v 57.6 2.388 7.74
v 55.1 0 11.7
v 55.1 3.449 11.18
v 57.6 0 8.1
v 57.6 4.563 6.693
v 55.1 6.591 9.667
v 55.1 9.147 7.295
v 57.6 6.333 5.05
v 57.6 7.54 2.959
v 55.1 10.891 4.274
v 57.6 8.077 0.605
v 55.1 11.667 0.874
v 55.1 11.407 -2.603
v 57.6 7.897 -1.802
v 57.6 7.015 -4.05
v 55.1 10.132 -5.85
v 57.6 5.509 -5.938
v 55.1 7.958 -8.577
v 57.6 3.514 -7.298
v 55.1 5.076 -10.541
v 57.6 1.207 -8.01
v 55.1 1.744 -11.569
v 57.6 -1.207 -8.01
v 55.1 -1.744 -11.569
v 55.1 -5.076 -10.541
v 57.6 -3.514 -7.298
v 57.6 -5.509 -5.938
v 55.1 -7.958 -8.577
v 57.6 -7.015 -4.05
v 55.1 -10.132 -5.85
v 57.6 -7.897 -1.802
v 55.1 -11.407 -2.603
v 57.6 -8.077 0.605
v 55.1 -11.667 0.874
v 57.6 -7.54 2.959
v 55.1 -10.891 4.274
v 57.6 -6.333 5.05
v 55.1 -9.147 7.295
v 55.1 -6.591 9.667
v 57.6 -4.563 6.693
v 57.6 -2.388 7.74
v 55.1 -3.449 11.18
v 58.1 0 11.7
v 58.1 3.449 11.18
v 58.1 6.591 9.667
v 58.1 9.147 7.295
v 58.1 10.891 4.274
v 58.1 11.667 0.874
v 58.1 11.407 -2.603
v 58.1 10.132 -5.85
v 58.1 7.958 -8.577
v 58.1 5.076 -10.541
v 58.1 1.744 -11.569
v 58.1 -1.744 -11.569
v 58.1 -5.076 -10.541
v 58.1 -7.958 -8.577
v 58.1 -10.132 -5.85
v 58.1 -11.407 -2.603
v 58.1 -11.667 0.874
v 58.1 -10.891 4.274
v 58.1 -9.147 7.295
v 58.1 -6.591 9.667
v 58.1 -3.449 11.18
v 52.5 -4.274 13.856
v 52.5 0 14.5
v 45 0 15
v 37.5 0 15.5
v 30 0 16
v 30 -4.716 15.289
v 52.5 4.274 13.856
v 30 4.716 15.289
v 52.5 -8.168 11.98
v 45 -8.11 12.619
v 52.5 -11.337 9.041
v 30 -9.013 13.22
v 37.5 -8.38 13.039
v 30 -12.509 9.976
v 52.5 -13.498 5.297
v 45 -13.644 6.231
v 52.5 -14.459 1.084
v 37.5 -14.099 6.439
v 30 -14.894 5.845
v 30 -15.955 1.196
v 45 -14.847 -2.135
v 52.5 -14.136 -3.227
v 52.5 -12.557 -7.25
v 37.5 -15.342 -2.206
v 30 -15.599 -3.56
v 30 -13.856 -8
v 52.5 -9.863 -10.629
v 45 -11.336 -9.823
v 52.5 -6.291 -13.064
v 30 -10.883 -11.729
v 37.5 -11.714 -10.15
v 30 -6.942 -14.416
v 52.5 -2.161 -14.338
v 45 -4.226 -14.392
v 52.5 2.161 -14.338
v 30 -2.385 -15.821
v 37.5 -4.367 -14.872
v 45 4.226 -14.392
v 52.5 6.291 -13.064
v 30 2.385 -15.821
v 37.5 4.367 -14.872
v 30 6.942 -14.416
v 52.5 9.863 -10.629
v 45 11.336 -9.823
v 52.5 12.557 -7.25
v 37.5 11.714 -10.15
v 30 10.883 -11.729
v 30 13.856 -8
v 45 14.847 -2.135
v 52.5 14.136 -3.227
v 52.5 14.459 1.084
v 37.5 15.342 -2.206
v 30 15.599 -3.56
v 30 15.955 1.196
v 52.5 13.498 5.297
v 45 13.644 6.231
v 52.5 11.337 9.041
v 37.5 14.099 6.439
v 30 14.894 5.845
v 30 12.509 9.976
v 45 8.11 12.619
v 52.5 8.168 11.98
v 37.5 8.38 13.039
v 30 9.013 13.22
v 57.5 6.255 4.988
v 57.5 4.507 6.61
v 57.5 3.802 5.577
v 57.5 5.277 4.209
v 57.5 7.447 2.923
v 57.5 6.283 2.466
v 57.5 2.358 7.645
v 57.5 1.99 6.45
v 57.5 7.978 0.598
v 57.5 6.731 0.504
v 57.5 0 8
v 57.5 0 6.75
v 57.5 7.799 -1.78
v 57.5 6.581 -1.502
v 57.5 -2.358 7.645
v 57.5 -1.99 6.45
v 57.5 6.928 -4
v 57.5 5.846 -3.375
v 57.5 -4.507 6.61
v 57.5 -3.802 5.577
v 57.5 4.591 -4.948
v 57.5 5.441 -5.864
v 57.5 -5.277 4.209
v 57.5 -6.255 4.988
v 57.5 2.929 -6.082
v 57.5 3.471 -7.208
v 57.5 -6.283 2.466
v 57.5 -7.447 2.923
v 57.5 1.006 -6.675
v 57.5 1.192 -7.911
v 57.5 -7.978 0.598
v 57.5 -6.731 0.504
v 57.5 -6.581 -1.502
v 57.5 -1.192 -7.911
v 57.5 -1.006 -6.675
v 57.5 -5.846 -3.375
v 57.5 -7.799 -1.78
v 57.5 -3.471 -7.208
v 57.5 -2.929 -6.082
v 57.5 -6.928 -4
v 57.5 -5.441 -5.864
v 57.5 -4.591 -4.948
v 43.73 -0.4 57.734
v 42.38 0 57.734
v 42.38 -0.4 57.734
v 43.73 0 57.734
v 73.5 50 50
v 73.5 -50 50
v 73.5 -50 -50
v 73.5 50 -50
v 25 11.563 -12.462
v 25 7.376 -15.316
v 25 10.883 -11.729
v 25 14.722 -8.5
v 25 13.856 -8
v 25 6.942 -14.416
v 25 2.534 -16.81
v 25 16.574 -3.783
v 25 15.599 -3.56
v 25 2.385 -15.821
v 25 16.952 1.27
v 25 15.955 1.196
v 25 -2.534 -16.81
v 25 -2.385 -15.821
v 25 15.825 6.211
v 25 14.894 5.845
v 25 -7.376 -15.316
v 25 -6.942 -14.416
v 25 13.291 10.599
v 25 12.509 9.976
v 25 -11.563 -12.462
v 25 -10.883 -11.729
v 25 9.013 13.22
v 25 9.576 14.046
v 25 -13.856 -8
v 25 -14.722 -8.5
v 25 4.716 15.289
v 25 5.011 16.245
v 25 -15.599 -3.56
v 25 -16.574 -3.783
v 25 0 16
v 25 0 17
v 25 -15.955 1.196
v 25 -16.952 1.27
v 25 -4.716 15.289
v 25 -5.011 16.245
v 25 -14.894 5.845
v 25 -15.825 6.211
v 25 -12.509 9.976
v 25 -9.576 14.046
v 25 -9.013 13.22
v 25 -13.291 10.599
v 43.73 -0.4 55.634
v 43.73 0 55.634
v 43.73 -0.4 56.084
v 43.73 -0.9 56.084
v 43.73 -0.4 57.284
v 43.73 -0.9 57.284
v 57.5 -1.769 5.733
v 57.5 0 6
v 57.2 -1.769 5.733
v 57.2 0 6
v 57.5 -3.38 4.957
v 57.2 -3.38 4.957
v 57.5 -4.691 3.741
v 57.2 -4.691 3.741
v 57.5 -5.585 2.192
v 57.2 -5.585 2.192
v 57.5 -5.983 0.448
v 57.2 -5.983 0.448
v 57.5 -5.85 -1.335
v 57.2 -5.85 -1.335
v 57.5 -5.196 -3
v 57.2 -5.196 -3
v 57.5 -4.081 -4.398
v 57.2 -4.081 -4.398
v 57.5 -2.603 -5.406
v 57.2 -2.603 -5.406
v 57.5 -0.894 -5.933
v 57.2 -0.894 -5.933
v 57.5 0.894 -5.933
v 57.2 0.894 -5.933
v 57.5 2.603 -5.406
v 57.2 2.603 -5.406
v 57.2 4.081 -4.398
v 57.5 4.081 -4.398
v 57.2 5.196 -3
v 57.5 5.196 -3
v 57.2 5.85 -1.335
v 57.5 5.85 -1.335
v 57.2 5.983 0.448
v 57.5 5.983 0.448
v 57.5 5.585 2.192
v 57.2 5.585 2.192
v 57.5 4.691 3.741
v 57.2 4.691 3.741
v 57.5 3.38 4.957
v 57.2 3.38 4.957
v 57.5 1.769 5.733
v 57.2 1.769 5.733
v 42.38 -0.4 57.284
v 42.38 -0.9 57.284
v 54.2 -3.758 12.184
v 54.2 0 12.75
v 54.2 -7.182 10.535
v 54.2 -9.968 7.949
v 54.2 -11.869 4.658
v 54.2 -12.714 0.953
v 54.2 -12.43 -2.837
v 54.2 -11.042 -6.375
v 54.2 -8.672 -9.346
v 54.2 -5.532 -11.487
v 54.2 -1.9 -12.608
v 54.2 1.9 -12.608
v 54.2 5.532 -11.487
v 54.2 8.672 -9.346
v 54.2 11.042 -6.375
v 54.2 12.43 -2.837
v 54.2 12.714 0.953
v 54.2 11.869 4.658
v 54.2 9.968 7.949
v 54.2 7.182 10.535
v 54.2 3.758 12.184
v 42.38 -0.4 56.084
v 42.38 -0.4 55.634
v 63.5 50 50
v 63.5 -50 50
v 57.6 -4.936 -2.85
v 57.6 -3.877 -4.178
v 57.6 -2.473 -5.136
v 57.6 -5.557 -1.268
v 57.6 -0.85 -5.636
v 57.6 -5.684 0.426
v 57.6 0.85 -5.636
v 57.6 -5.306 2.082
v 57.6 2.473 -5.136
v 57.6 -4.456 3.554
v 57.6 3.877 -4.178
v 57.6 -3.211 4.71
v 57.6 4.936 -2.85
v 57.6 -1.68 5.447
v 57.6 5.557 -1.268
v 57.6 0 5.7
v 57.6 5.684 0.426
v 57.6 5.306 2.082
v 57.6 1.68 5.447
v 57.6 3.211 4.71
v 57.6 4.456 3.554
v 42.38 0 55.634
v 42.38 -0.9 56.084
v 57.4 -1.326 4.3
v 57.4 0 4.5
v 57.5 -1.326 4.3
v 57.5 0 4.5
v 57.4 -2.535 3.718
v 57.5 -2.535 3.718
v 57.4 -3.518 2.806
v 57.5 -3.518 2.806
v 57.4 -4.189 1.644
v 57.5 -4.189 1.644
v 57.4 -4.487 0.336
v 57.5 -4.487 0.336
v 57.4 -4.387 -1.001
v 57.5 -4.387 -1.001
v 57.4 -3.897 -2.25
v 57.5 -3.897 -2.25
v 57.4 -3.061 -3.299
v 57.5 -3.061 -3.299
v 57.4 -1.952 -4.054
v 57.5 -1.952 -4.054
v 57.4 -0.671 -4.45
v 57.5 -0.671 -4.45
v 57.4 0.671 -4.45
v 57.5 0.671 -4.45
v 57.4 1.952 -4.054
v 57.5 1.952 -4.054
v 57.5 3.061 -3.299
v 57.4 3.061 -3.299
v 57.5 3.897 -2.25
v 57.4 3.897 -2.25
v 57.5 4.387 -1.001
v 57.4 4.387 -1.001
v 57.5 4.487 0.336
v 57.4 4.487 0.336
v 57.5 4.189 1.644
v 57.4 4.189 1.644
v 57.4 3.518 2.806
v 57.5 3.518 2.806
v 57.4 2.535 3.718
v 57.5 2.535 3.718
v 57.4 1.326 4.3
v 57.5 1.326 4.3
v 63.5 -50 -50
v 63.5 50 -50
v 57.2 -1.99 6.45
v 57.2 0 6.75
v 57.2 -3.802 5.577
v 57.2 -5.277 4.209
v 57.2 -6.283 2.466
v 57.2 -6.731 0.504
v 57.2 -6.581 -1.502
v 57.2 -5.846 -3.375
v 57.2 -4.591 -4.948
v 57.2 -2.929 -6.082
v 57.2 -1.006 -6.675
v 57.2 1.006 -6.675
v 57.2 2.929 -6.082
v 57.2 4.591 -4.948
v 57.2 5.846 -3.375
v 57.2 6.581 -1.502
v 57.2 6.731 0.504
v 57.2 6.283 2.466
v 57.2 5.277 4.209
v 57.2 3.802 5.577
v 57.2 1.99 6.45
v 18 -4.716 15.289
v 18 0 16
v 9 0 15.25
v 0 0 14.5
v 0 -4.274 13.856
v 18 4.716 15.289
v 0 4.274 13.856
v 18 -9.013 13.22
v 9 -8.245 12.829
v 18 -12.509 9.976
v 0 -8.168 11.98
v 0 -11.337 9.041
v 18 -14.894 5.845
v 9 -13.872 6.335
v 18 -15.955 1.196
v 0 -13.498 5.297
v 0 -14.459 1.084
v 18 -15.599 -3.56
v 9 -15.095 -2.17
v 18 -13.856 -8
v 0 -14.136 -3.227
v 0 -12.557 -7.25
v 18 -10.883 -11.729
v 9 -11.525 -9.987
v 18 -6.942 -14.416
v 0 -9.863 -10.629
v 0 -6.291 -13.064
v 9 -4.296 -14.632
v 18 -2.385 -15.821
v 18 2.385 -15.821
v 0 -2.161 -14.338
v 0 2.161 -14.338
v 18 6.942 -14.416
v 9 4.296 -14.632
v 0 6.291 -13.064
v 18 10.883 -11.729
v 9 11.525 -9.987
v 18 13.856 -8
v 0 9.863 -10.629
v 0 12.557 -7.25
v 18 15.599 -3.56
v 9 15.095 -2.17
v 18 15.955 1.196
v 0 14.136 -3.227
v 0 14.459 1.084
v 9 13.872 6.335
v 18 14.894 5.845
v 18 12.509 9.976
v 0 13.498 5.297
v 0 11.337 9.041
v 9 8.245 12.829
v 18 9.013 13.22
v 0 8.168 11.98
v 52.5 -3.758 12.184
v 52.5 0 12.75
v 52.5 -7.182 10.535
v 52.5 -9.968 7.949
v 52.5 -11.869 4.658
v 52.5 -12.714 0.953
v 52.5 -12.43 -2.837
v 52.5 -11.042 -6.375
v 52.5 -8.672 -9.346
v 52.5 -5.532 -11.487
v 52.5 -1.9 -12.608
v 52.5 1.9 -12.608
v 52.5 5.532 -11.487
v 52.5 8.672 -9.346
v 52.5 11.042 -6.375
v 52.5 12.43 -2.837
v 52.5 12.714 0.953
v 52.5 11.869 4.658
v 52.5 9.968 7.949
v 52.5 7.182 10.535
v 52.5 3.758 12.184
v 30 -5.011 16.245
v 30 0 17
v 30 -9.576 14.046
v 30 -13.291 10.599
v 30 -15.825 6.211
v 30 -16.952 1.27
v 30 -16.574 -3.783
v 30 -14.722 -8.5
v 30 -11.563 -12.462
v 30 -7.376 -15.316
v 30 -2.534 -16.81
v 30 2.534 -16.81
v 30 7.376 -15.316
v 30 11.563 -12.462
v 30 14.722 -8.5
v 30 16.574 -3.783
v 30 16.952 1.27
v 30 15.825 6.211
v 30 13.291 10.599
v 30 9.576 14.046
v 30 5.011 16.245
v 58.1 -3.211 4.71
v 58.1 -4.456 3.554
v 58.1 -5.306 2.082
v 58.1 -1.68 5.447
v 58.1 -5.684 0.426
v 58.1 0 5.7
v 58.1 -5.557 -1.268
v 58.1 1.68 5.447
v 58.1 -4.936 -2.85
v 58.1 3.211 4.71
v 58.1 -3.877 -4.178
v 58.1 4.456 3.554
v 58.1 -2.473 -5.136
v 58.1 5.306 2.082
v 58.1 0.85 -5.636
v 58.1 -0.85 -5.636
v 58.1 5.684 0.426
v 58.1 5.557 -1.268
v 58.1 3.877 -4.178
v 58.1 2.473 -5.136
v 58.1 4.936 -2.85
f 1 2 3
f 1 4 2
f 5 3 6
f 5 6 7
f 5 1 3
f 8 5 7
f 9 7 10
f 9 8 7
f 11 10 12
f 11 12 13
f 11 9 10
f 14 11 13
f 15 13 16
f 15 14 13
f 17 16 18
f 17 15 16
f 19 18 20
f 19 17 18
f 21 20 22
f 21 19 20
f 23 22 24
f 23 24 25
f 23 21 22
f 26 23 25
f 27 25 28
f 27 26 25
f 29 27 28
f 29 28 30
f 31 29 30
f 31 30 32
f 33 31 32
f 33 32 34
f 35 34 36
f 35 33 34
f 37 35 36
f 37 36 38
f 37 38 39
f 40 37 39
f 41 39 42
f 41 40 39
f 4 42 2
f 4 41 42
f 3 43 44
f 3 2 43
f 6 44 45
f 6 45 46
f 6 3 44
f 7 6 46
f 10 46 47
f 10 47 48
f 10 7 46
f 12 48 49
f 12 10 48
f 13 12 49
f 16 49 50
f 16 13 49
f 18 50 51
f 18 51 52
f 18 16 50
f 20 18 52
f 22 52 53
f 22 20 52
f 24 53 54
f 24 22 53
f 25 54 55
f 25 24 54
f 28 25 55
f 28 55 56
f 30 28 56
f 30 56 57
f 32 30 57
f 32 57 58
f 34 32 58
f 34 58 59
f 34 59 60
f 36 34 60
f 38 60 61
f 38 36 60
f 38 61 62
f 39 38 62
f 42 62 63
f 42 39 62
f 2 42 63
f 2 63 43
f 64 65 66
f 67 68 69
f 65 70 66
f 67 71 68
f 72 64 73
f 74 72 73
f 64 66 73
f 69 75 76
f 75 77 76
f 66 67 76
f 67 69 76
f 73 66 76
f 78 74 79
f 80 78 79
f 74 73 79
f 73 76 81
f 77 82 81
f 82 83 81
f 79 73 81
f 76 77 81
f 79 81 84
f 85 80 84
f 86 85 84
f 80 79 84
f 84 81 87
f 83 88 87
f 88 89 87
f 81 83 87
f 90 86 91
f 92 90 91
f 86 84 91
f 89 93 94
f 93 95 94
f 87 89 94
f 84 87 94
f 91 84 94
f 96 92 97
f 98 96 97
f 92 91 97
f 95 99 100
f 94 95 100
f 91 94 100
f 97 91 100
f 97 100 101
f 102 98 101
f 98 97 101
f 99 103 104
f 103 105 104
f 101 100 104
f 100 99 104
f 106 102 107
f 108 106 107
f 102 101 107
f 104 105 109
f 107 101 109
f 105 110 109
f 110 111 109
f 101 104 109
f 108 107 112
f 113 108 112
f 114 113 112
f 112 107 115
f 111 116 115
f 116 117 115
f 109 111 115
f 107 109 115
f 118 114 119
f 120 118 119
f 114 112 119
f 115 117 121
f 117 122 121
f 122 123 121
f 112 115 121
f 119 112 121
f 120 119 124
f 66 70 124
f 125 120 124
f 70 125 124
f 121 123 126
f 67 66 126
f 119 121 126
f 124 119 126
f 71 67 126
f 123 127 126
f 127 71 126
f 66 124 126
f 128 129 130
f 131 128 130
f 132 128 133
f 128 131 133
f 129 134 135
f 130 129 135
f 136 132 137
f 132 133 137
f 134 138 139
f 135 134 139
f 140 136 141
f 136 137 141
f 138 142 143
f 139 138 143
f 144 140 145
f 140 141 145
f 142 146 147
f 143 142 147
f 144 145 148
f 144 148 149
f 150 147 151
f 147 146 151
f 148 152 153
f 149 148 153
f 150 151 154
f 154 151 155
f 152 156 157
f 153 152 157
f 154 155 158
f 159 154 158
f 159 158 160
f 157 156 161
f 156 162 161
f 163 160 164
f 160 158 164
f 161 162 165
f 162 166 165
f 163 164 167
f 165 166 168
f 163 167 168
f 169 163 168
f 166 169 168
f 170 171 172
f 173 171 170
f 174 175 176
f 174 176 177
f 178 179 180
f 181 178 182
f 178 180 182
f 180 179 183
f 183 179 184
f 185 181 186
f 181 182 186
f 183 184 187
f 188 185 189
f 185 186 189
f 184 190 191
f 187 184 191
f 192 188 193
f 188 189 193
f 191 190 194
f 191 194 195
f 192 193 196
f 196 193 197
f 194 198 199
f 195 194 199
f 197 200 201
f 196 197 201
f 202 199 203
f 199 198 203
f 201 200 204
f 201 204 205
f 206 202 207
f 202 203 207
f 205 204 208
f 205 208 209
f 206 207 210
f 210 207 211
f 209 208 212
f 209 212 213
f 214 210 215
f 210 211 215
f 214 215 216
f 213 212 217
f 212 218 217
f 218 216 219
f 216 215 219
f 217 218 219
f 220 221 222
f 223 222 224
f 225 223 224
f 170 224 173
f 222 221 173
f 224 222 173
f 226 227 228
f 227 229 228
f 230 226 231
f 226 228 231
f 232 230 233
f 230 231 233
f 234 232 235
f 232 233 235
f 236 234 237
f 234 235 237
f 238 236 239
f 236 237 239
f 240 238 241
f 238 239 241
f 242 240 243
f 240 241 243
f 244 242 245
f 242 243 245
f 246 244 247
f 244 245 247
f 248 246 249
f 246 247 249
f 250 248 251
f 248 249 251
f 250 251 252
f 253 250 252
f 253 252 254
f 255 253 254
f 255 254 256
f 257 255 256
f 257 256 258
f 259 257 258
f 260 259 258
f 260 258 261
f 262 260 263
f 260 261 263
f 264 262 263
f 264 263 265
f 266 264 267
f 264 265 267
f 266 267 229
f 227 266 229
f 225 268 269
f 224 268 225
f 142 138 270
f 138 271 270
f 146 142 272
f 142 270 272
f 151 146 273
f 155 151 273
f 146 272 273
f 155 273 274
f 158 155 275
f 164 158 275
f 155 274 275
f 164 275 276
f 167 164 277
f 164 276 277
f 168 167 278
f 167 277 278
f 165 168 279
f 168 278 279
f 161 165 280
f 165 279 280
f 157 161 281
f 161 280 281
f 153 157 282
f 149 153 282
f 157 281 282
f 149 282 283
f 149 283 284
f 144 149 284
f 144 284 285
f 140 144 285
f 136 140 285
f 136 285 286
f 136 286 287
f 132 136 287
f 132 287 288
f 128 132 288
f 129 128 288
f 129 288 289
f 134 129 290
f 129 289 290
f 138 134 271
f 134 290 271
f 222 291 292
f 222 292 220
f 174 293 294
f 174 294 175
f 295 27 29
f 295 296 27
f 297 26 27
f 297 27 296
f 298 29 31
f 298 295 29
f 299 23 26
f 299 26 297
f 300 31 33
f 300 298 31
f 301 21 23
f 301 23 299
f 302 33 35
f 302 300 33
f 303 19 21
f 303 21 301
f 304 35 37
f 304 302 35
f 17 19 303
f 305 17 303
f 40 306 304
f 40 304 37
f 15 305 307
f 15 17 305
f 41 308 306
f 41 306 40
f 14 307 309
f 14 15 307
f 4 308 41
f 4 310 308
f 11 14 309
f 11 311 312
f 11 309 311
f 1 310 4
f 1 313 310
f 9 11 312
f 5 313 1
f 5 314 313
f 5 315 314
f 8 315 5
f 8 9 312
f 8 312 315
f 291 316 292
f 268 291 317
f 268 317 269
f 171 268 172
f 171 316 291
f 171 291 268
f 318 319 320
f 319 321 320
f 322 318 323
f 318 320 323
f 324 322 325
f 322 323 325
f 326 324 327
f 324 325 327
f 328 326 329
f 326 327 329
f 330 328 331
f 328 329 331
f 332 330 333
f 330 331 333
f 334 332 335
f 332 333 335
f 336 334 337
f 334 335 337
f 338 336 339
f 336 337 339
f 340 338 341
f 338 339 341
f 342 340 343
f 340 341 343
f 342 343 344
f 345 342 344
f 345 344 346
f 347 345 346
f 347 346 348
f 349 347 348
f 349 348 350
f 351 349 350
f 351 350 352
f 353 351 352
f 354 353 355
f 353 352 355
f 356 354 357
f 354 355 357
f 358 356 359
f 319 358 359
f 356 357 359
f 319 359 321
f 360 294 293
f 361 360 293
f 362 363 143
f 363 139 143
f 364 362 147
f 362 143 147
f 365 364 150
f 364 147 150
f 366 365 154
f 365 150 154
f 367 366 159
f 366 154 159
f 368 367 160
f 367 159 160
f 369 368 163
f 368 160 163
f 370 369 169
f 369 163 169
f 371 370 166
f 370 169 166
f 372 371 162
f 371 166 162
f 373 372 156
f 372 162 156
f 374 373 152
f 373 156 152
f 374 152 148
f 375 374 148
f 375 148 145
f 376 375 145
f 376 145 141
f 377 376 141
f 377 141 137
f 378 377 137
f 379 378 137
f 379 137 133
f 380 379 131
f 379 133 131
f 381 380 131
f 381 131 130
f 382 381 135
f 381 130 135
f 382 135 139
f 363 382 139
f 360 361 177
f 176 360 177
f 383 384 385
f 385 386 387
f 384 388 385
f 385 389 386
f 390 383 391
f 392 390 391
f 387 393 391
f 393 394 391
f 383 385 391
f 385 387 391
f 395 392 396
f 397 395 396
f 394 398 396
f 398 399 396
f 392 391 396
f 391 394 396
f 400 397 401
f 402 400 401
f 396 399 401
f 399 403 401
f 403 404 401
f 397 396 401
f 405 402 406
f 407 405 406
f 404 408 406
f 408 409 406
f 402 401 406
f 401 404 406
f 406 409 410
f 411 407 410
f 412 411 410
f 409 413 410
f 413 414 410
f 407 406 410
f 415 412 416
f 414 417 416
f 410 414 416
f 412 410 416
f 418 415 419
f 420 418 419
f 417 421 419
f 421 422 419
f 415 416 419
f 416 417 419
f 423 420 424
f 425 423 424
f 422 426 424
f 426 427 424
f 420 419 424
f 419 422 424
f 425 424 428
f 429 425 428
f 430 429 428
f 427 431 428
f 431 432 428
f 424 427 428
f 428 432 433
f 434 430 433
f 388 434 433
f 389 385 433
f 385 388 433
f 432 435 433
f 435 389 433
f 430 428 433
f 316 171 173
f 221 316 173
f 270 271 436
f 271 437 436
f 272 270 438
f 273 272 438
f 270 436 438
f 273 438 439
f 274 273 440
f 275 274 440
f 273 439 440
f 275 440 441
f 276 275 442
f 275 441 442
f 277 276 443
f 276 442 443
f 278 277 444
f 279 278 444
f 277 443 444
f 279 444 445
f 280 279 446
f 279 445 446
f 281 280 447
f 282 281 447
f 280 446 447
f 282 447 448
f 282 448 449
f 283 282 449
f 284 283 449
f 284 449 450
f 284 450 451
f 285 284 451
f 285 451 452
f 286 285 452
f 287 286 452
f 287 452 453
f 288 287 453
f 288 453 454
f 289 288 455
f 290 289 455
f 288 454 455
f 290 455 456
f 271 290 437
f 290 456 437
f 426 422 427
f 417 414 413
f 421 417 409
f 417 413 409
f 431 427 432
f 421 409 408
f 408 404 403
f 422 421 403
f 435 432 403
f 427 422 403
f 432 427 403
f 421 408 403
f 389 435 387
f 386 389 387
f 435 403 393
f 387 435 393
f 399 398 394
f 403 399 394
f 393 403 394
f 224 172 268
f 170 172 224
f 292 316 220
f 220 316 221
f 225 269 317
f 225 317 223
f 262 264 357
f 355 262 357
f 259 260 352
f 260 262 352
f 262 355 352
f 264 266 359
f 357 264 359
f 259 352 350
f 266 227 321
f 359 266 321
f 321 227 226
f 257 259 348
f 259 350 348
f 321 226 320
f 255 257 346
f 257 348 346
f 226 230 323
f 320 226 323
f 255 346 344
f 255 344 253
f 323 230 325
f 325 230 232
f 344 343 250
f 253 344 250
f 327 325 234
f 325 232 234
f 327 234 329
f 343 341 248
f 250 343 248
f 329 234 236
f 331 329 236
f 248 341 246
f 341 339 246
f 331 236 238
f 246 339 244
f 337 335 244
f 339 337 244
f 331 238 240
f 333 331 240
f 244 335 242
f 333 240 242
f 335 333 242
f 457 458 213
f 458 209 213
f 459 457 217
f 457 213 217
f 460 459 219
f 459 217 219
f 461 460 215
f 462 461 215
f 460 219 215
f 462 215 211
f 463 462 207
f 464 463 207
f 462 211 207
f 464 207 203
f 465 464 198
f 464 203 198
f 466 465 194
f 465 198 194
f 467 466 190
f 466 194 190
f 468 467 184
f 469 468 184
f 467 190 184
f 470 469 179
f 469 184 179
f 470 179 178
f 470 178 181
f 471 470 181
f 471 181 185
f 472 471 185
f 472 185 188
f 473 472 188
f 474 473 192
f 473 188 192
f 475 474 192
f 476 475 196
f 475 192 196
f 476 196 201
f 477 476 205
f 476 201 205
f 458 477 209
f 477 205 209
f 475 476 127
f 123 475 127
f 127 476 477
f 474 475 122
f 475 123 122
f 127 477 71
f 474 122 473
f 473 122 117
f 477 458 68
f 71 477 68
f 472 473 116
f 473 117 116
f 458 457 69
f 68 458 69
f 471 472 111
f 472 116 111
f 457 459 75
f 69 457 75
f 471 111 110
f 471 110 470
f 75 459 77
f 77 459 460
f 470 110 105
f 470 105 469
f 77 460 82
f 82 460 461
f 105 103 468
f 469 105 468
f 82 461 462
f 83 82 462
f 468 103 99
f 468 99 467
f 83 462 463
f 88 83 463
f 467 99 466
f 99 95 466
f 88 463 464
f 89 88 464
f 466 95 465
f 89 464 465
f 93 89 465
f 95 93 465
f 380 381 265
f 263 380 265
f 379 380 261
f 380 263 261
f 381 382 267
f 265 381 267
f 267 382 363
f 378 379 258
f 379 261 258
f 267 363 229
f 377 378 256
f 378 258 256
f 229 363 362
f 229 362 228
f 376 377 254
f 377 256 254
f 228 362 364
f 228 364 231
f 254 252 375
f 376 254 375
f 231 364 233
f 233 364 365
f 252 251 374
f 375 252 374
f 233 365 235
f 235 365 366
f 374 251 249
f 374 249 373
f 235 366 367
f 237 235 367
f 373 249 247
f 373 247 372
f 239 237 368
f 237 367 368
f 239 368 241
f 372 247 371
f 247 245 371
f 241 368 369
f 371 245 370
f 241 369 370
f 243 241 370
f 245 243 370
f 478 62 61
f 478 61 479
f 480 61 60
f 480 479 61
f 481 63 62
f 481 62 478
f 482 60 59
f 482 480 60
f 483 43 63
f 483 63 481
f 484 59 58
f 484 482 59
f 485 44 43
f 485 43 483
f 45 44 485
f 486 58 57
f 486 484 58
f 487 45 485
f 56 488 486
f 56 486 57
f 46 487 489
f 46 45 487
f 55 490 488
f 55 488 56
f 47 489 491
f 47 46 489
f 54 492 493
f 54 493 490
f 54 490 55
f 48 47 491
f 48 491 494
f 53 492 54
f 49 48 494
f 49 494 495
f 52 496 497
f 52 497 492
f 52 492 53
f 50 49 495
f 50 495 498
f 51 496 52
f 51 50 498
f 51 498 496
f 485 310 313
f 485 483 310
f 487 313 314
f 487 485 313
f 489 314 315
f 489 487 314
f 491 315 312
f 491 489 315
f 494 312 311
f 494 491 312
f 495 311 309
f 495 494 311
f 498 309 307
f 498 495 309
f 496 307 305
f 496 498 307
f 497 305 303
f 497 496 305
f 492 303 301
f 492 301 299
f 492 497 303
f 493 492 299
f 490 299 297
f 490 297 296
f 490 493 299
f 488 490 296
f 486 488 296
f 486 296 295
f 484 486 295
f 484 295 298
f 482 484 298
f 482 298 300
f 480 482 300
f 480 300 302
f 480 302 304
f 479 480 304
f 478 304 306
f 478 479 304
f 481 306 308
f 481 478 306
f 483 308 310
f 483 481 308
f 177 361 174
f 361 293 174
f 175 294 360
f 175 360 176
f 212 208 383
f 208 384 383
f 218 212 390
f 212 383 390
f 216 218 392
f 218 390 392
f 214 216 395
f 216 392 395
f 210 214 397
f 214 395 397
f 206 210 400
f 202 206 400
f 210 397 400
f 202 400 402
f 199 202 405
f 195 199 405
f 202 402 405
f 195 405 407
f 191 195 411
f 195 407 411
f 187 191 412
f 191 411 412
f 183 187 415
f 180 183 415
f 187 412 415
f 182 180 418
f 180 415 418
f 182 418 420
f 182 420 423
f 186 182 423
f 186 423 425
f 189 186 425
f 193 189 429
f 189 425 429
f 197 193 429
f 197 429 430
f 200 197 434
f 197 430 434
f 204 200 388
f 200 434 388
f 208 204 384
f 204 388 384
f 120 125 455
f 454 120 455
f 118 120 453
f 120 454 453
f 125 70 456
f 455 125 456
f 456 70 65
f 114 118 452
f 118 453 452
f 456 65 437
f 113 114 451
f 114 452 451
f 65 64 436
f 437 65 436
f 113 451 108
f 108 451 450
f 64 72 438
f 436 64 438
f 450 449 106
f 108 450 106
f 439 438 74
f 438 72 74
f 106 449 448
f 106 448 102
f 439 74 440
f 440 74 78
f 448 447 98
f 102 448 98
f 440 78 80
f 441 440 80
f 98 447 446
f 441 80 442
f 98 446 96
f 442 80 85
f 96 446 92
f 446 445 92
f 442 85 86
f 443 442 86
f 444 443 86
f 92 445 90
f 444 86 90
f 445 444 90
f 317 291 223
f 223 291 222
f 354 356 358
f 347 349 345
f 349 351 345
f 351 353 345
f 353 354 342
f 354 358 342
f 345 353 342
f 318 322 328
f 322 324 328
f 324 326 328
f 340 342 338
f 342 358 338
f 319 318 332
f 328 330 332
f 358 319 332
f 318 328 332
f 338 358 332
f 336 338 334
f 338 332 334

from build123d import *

# Parameters (mm, degrees)
F3_W      = 10
F3_H      = 100
F4_DEPTH  = 50
F7_W      = 1.35
F7_H      = 2.1
F8_DEPTH  = 0.4
F9_W      = 1.35
F9_H      = 1.2
F10_DEPTH = 0.5


with BuildPart() as f2:
    # F0 (on Front) → F2 (revolve)
    with BuildSketch(Plane.XZ):
        Polygon((0, 14.5), (0, 0), (57.4, 0), (57.4, 4.5), (57.5, 4.5), (57.5, 6), (57.2, 6), (57.2, 6.75), (57.5, 6.75), (57.5, 8), (54.2, 12.75), (52.5, 12.75), (52.5, 14.5), (30, 16), (30, 17), (25, 17), (25, 16), (18, 16), align=None)
    revolve(axis=Axis((30.165957, 0, 0), (1, 0, 0)))


with BuildPart() as f4:
    # F3 (on Top) → F4 (new body, symmetric)
    with BuildSketch(Plane.XY):
        with Locations((68.5, 0)):
            Rectangle(F3_W, F3_H)
    extrude(amount=F4_DEPTH, both=True)


with BuildPart() as f6:
    # F5 (on Front) → F6 (revolve)
    with BuildSketch(Plane.XZ):
        Polygon((57.6, 8.1), (57.6, 5.7), (58.1, 5.7), (58.1, 11.7), (55.1, 11.7), align=None)
    revolve(axis=Axis((54.094689, 0, 0), (-1, 0, 0)))


with BuildPart() as f8:
    # F7 (on Front) → F8 (new body)
    with BuildSketch(Plane.XZ):
        with Locations((43.055139, 56.683564)):
            Rectangle(F7_W, F7_H)
    extrude(amount=F8_DEPTH)

    # F9 (on face) → F10 (join)
    with BuildSketch(Plane.XZ.offset(0.4)):
        with Locations((43.055139, 56.683564)):
            Rectangle(F9_W, F9_H)
    extrude(amount=F10_DEPTH)


solid = Compound([f2.part, f4.part, f6.part, f8.part])
